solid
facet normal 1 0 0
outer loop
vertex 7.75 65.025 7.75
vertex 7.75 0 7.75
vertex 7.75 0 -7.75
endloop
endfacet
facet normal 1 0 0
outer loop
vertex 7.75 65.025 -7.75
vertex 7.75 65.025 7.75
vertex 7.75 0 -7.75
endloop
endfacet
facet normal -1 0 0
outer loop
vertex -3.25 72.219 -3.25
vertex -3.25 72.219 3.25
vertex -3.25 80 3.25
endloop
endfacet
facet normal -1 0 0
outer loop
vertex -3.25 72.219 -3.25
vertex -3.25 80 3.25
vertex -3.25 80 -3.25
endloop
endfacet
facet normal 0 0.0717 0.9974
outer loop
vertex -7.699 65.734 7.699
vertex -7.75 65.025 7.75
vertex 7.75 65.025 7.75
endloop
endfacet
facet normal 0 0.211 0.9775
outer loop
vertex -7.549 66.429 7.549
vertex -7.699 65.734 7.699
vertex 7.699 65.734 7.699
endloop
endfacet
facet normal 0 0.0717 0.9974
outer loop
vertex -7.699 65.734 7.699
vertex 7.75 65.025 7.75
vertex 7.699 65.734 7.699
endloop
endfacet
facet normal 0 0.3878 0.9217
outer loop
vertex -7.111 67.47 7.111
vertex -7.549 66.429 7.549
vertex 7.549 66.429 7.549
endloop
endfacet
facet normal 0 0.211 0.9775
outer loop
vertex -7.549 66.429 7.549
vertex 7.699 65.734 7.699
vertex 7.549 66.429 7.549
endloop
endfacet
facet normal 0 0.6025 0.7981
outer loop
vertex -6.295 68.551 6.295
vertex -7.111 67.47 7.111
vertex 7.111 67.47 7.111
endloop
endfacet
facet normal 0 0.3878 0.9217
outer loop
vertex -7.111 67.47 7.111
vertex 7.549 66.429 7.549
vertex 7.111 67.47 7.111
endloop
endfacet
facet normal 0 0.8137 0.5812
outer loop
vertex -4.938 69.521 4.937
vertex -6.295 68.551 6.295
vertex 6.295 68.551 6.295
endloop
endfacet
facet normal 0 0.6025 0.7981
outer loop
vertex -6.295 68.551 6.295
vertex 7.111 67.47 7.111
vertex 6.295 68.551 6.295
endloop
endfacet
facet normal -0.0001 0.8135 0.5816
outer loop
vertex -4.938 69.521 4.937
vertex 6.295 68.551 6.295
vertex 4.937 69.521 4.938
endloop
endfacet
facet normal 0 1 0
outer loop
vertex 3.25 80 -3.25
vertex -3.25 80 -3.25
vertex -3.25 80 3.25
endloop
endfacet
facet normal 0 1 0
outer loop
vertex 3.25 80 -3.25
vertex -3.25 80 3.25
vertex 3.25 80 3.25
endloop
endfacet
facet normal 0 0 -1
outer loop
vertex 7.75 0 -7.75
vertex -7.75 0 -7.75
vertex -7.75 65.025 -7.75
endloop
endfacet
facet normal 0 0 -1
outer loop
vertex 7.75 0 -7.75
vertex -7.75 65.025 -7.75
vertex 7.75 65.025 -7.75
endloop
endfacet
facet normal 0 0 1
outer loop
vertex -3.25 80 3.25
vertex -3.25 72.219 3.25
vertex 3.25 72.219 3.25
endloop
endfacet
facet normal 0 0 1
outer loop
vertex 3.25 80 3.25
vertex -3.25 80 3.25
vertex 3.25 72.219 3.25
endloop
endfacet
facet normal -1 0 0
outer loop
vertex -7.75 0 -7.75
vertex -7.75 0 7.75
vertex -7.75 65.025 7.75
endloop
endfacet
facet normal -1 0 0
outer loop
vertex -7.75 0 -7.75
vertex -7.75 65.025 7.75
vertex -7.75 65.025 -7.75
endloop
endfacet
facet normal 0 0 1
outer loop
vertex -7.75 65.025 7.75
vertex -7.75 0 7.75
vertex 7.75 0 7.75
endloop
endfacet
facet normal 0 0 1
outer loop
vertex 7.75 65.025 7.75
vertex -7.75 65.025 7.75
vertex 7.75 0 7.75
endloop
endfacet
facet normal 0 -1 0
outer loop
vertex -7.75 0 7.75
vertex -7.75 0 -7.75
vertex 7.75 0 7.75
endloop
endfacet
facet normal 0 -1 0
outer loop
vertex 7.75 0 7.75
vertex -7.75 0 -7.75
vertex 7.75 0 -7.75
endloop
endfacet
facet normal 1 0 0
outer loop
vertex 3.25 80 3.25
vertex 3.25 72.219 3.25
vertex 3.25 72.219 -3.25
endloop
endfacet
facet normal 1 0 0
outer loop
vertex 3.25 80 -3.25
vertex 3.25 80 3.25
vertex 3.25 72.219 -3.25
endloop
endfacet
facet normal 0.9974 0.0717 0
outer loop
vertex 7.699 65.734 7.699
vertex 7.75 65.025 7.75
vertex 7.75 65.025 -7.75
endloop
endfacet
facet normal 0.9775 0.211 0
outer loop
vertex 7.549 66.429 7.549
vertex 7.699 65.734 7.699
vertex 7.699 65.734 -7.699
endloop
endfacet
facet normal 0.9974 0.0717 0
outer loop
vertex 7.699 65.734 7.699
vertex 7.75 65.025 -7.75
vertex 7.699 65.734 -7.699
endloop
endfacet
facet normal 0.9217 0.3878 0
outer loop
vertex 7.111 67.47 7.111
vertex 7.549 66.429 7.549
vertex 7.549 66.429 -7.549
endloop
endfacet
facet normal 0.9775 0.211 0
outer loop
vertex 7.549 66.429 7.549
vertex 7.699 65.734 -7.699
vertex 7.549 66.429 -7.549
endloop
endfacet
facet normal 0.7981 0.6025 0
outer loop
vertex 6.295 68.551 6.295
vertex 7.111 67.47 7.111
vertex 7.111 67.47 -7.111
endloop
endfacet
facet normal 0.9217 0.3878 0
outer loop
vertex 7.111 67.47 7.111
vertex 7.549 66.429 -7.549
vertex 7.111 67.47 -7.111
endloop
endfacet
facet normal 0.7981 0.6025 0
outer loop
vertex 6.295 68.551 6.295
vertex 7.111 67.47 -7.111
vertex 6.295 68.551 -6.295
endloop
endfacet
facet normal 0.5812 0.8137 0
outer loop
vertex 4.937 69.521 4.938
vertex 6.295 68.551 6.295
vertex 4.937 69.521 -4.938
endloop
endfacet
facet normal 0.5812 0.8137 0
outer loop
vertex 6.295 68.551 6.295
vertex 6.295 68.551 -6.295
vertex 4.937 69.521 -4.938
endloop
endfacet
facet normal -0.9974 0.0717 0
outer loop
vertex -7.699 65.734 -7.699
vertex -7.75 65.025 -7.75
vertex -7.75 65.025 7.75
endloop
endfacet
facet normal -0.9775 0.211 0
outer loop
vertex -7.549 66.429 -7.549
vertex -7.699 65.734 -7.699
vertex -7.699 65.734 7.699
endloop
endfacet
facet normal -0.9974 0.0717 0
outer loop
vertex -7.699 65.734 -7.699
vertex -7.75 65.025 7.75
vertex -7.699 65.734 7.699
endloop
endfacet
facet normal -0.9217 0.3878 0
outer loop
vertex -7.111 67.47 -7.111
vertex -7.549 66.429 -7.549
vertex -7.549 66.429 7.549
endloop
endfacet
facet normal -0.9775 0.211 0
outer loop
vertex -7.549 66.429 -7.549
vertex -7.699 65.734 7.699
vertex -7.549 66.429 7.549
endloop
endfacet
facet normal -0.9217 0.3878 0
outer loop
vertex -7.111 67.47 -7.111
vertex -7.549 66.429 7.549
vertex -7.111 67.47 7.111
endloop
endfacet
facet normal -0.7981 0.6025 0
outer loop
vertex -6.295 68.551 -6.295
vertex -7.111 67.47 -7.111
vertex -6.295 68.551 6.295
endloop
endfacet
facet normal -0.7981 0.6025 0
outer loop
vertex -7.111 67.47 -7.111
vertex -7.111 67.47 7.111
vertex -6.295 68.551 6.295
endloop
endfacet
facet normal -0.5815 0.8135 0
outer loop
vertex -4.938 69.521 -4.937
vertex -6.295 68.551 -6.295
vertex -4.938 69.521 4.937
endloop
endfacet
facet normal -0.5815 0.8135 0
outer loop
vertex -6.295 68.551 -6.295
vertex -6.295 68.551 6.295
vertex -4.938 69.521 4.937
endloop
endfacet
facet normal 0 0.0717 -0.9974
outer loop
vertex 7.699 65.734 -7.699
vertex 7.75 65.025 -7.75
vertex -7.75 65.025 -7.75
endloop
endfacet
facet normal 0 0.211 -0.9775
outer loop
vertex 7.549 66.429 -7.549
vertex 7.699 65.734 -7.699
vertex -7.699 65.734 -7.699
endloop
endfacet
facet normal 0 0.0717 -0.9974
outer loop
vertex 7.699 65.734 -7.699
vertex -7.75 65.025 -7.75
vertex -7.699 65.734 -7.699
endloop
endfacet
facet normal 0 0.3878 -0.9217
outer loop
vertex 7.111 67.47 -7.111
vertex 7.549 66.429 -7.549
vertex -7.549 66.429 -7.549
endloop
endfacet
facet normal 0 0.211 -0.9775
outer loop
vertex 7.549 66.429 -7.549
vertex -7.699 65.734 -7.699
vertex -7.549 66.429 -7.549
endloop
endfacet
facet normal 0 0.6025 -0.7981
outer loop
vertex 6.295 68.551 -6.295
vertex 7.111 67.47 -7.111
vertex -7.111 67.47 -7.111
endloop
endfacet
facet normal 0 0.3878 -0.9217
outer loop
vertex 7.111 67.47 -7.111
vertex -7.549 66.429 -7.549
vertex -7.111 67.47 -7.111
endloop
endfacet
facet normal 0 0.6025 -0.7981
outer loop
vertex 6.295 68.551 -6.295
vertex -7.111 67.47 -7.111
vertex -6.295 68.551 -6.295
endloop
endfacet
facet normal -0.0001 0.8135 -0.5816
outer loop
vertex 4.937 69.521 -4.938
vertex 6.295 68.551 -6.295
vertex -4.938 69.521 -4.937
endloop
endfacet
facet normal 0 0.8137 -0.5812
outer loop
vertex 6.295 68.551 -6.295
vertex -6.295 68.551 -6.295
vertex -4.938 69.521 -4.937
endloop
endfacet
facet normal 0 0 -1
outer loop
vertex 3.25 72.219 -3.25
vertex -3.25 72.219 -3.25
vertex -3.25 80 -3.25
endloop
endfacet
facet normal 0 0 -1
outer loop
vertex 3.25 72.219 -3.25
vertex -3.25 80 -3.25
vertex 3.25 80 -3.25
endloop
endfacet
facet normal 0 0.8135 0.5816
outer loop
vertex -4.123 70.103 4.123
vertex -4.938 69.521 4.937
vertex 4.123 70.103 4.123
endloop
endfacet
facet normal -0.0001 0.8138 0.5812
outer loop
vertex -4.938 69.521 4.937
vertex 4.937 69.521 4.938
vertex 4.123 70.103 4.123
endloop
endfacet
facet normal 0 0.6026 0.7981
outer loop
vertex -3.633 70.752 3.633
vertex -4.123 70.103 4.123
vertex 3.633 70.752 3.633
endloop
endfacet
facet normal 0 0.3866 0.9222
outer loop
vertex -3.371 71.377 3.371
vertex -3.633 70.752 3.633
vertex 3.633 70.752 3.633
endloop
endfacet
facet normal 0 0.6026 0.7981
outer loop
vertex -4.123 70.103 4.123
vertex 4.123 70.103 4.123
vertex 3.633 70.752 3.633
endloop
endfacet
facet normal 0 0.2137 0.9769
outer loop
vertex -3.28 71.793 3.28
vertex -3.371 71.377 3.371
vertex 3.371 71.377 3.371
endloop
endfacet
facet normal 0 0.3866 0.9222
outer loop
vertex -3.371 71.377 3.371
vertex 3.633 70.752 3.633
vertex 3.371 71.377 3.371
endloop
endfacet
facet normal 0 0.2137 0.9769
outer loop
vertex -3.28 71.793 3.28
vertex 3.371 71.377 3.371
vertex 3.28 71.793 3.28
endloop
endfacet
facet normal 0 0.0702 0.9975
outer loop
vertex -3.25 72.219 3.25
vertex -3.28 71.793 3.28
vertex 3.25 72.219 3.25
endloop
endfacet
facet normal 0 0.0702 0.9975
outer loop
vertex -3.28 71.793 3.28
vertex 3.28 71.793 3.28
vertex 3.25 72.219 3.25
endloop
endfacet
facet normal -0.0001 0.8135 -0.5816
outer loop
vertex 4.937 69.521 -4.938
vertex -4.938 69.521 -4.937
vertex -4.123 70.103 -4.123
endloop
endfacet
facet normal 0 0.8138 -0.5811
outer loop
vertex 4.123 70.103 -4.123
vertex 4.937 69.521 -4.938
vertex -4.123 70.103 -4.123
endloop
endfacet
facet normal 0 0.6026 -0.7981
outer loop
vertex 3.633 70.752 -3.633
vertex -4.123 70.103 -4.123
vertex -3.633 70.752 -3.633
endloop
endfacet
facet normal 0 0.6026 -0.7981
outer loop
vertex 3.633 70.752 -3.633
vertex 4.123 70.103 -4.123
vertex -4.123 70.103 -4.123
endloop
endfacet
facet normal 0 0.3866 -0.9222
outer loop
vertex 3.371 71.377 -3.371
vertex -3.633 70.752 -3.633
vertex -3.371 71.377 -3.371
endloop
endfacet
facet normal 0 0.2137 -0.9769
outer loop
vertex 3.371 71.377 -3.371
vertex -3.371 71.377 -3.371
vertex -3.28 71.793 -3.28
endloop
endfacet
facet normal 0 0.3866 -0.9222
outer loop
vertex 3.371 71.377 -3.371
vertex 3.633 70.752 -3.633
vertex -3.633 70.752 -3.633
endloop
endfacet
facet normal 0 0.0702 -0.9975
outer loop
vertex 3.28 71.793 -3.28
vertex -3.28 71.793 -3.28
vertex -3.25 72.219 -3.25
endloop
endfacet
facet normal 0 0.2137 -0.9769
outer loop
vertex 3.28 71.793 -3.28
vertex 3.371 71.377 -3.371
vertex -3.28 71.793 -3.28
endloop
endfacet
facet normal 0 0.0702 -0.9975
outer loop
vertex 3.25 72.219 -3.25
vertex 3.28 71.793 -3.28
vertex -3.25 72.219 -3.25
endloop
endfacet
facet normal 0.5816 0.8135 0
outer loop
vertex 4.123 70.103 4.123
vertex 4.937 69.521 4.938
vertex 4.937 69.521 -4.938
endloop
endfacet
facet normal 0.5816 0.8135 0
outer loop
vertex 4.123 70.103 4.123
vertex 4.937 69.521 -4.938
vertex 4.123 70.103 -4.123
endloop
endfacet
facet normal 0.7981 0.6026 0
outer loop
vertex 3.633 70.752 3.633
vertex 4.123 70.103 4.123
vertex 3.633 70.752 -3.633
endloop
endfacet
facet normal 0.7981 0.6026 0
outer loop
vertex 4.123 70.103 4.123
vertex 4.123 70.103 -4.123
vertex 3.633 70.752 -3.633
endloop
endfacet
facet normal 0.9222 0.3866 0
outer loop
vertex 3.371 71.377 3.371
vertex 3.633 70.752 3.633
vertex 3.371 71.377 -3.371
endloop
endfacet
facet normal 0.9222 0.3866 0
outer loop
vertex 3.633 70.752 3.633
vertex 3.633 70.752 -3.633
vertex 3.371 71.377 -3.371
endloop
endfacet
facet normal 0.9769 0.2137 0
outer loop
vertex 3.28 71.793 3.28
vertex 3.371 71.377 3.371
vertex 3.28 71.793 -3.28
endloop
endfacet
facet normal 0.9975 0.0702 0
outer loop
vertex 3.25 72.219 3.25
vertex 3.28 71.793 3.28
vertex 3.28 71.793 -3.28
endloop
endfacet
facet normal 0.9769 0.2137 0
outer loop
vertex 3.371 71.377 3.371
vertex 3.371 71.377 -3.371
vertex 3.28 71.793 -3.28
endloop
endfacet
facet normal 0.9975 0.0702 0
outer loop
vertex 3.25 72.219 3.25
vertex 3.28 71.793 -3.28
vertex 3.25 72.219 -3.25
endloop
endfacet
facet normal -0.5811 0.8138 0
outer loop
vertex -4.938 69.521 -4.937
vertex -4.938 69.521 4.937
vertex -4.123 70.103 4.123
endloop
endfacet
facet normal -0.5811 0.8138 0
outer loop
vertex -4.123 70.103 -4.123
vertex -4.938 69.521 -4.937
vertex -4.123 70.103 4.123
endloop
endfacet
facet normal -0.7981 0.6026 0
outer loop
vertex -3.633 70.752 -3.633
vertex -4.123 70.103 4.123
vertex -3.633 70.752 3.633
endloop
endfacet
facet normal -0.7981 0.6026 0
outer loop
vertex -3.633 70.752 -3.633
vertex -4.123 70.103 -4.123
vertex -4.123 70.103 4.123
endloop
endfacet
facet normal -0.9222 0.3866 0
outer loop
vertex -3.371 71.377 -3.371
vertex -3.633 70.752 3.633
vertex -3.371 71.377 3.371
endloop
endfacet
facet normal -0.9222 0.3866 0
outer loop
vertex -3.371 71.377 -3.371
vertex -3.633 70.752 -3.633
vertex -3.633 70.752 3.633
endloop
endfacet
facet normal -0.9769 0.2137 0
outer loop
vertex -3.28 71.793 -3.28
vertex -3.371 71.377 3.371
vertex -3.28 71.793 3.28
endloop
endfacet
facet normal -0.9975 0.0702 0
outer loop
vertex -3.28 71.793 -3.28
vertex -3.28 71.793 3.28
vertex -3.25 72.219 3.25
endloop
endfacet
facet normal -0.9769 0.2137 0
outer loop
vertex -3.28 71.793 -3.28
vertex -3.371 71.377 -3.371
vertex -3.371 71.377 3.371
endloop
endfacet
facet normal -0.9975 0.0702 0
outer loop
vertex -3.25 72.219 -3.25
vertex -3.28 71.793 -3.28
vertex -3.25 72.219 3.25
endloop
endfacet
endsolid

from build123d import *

# Parameters (mm, degrees)
SKETCH1_W           = 15.5
SKETCH1_H           = 15.5
BOSS_EXTRUDE1_DEPTH = 70
SKETCH2_W           = 6.5
SKETCH2_H           = 6.5
BOSS_EXTRUDE2_DEPTH = 10
FILLET1_R           = 5
FILLET2_R           = 3


with BuildPart() as part:
    # Sketch1 → Boss-Extrude1 (new body)
    with BuildSketch(Plane(origin=(0, 0, 0), x_dir=(1, 0, 0), z_dir=(0, 1, 0))):
        Rectangle(SKETCH1_W, SKETCH1_H)
    extrude(amount=BOSS_EXTRUDE1_DEPTH)

    # Sketch2 → Boss-Extrude2 (add)
    with BuildSketch(Plane(origin=(0, 70, 0), x_dir=(1, 0, 0), z_dir=(0, 1, 0))):
        Rectangle(SKETCH2_W, SKETCH2_H)
    extrude(amount=BOSS_EXTRUDE2_DEPTH)

    # Fillet1
    # the kernel refuses this fillet: 5 mm, written as the material it takes off along each edge
    with BuildSketch(Plane(origin=(-7.75, 70, 20.187342964), x_dir=(0, -1, 0), z_dir=(0, 0, -1)), Plane(origin=(7.75, 70, -20.187342964), x_dir=(0, -1, 0), z_dir=(0, 0, 1)), Plane(origin=(-20.187342964, 70, -7.75), x_dir=(0, -1, 0), z_dir=(1, 0, 0))) as fillet1_piece_1:
        with BuildLine():
            CenterArc((4.974937186, -5), FILLET1_R, 90, 84.260829523)
            Line((0, -4.5), (-0.099498744, -4.49))
            ThreePointArc((-0.099498744, -4.49), (-0.1, -2.25), (-0.1, 0))
            Line((-0.1, 0), (0, 0.1))
            Line((0, 0.1), (4.974937186, 0.1))
            Line((4.974937186, 0.1), (4.974937186, 0))
        make_face()
    extrude(amount=40.374685928, mode=Mode.SUBTRACT)
    with BuildSketch(Plane(origin=(20.187342964, 70, 7.75), x_dir=(0, 0, -1), z_dir=(-1, 0, 0))) as fillet1_piece_2:
        with BuildLine():
            CenterArc((5, 4.974937186), FILLET1_R, 180, 84.260829523)
            Line((0, 4.974937186), (-0.1, 4.974937186))
            Line((-0.1, 4.974937186), (-0.1, 0))
            Line((-0.1, 0), (0, -0.1))
            ThreePointArc((0, -0.1), (2.25, -0.1), (4.49, -0.099498744))
            Line((4.49, -0.099498744), (4.5, 0))
        make_face()
    extrude(amount=40.374685928, mode=Mode.SUBTRACT)

    # Fillet2
    fillet2_edges = [part.edges().sort_by_distance(p)[0] for p in [
        (-3.25, 70, 0),
        (0, 70, -3.25),
        (0, 70, 3.25),
        (3.25, 70, 0),
    ]]
    fillet(fillet2_edges, radius=FILLET2_R)


solid = part.part
